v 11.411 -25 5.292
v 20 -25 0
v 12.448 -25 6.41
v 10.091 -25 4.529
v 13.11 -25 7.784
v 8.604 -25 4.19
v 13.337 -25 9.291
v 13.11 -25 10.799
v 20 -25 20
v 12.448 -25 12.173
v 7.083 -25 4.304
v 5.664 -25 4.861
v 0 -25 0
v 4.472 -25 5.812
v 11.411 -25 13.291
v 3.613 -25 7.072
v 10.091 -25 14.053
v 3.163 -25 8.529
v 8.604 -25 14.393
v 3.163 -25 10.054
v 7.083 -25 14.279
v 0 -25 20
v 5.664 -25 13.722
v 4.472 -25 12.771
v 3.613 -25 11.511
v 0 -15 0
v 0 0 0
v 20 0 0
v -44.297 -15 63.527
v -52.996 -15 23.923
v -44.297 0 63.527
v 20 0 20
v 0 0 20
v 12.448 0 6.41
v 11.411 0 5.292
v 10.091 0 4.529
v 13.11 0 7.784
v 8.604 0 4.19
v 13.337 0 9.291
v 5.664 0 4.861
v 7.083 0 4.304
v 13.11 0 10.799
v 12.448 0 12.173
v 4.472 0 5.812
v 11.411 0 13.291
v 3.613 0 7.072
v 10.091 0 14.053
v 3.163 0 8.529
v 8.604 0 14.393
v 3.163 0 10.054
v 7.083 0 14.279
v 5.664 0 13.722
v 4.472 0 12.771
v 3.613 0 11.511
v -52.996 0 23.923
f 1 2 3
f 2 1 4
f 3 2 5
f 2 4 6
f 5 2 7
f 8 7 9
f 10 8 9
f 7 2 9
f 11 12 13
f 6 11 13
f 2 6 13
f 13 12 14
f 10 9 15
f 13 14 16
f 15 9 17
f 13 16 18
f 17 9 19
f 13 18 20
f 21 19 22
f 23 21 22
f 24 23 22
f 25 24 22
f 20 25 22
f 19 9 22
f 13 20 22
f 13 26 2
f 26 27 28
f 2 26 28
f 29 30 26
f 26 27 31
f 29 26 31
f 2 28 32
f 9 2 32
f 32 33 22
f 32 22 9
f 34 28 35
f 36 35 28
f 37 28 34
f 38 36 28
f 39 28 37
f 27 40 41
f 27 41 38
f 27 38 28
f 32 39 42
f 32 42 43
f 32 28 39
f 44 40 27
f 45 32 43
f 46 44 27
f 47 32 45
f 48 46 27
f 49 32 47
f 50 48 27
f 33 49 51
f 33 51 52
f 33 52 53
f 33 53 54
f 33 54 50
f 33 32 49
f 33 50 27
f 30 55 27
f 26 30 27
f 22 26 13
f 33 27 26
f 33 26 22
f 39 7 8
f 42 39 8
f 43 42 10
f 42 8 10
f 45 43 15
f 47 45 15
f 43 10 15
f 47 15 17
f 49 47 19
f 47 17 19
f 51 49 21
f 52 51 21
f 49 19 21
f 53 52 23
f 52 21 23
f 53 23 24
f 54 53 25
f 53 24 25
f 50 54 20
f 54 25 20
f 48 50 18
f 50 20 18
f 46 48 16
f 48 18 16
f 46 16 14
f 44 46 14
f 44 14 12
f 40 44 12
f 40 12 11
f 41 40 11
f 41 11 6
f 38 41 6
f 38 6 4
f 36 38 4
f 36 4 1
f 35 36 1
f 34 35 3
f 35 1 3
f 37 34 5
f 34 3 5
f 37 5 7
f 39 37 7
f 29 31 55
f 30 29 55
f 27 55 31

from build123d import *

# Parameters (mm, degrees)
F1_DEPTH = 15
F2_W     = 20
F2_H     = 20
F3_DEPTH = 20
F5_R     = 7.569686
F4_W     = 20
F4_H     = 20
F6_DEPTH = 25
F7_R     = 5.115705
F8_DEPTH = 25


with BuildPart() as f1:
    # F0 (on Front) → F1 (new body)
    with BuildSketch(Plane.XZ):
        Polygon((-52.996006, 23.922602), (0, 0), (-44.296876, 63.526526), align=None)
    extrude(amount=F1_DEPTH)



with BuildPart() as f3:
    # F2 (on Front) → F3 (new body)
    with BuildSketch(Plane.XZ):
        with Locations((10, 10)):
            Rectangle(F2_W, F2_H)
    extrude(amount=F3_DEPTH)


with BuildPart() as f1_1:
    add(f1.part)

    add(f3.part)  # F6 merges F3
    # F5 (on face) + F4 (on face) → F6 (join)
    with BuildSketch(Plane(origin=(0, 0, 0), x_dir=(-1, 0, 0), z_dir=(0, 1, 0))):
        with Locations((-11.184696, 10)):
            Circle(F5_R)
    with BuildSketch(Plane(origin=(0, 0, 0), x_dir=(-1, 0, 0), z_dir=(0, 1, 0))):
        with Locations((-10, 10)):
            Rectangle(F4_W, F4_H)
    extrude(amount=-F6_DEPTH)

    # F7 (on face) → F8 (cut)
    with BuildSketch(Plane.XZ.offset(25)):
        with Locations((8.221688, 9.291411)):
            Circle(F7_R)
    extrude(amount=-F8_DEPTH, mode=Mode.SUBTRACT)


solid = f1_1.part
